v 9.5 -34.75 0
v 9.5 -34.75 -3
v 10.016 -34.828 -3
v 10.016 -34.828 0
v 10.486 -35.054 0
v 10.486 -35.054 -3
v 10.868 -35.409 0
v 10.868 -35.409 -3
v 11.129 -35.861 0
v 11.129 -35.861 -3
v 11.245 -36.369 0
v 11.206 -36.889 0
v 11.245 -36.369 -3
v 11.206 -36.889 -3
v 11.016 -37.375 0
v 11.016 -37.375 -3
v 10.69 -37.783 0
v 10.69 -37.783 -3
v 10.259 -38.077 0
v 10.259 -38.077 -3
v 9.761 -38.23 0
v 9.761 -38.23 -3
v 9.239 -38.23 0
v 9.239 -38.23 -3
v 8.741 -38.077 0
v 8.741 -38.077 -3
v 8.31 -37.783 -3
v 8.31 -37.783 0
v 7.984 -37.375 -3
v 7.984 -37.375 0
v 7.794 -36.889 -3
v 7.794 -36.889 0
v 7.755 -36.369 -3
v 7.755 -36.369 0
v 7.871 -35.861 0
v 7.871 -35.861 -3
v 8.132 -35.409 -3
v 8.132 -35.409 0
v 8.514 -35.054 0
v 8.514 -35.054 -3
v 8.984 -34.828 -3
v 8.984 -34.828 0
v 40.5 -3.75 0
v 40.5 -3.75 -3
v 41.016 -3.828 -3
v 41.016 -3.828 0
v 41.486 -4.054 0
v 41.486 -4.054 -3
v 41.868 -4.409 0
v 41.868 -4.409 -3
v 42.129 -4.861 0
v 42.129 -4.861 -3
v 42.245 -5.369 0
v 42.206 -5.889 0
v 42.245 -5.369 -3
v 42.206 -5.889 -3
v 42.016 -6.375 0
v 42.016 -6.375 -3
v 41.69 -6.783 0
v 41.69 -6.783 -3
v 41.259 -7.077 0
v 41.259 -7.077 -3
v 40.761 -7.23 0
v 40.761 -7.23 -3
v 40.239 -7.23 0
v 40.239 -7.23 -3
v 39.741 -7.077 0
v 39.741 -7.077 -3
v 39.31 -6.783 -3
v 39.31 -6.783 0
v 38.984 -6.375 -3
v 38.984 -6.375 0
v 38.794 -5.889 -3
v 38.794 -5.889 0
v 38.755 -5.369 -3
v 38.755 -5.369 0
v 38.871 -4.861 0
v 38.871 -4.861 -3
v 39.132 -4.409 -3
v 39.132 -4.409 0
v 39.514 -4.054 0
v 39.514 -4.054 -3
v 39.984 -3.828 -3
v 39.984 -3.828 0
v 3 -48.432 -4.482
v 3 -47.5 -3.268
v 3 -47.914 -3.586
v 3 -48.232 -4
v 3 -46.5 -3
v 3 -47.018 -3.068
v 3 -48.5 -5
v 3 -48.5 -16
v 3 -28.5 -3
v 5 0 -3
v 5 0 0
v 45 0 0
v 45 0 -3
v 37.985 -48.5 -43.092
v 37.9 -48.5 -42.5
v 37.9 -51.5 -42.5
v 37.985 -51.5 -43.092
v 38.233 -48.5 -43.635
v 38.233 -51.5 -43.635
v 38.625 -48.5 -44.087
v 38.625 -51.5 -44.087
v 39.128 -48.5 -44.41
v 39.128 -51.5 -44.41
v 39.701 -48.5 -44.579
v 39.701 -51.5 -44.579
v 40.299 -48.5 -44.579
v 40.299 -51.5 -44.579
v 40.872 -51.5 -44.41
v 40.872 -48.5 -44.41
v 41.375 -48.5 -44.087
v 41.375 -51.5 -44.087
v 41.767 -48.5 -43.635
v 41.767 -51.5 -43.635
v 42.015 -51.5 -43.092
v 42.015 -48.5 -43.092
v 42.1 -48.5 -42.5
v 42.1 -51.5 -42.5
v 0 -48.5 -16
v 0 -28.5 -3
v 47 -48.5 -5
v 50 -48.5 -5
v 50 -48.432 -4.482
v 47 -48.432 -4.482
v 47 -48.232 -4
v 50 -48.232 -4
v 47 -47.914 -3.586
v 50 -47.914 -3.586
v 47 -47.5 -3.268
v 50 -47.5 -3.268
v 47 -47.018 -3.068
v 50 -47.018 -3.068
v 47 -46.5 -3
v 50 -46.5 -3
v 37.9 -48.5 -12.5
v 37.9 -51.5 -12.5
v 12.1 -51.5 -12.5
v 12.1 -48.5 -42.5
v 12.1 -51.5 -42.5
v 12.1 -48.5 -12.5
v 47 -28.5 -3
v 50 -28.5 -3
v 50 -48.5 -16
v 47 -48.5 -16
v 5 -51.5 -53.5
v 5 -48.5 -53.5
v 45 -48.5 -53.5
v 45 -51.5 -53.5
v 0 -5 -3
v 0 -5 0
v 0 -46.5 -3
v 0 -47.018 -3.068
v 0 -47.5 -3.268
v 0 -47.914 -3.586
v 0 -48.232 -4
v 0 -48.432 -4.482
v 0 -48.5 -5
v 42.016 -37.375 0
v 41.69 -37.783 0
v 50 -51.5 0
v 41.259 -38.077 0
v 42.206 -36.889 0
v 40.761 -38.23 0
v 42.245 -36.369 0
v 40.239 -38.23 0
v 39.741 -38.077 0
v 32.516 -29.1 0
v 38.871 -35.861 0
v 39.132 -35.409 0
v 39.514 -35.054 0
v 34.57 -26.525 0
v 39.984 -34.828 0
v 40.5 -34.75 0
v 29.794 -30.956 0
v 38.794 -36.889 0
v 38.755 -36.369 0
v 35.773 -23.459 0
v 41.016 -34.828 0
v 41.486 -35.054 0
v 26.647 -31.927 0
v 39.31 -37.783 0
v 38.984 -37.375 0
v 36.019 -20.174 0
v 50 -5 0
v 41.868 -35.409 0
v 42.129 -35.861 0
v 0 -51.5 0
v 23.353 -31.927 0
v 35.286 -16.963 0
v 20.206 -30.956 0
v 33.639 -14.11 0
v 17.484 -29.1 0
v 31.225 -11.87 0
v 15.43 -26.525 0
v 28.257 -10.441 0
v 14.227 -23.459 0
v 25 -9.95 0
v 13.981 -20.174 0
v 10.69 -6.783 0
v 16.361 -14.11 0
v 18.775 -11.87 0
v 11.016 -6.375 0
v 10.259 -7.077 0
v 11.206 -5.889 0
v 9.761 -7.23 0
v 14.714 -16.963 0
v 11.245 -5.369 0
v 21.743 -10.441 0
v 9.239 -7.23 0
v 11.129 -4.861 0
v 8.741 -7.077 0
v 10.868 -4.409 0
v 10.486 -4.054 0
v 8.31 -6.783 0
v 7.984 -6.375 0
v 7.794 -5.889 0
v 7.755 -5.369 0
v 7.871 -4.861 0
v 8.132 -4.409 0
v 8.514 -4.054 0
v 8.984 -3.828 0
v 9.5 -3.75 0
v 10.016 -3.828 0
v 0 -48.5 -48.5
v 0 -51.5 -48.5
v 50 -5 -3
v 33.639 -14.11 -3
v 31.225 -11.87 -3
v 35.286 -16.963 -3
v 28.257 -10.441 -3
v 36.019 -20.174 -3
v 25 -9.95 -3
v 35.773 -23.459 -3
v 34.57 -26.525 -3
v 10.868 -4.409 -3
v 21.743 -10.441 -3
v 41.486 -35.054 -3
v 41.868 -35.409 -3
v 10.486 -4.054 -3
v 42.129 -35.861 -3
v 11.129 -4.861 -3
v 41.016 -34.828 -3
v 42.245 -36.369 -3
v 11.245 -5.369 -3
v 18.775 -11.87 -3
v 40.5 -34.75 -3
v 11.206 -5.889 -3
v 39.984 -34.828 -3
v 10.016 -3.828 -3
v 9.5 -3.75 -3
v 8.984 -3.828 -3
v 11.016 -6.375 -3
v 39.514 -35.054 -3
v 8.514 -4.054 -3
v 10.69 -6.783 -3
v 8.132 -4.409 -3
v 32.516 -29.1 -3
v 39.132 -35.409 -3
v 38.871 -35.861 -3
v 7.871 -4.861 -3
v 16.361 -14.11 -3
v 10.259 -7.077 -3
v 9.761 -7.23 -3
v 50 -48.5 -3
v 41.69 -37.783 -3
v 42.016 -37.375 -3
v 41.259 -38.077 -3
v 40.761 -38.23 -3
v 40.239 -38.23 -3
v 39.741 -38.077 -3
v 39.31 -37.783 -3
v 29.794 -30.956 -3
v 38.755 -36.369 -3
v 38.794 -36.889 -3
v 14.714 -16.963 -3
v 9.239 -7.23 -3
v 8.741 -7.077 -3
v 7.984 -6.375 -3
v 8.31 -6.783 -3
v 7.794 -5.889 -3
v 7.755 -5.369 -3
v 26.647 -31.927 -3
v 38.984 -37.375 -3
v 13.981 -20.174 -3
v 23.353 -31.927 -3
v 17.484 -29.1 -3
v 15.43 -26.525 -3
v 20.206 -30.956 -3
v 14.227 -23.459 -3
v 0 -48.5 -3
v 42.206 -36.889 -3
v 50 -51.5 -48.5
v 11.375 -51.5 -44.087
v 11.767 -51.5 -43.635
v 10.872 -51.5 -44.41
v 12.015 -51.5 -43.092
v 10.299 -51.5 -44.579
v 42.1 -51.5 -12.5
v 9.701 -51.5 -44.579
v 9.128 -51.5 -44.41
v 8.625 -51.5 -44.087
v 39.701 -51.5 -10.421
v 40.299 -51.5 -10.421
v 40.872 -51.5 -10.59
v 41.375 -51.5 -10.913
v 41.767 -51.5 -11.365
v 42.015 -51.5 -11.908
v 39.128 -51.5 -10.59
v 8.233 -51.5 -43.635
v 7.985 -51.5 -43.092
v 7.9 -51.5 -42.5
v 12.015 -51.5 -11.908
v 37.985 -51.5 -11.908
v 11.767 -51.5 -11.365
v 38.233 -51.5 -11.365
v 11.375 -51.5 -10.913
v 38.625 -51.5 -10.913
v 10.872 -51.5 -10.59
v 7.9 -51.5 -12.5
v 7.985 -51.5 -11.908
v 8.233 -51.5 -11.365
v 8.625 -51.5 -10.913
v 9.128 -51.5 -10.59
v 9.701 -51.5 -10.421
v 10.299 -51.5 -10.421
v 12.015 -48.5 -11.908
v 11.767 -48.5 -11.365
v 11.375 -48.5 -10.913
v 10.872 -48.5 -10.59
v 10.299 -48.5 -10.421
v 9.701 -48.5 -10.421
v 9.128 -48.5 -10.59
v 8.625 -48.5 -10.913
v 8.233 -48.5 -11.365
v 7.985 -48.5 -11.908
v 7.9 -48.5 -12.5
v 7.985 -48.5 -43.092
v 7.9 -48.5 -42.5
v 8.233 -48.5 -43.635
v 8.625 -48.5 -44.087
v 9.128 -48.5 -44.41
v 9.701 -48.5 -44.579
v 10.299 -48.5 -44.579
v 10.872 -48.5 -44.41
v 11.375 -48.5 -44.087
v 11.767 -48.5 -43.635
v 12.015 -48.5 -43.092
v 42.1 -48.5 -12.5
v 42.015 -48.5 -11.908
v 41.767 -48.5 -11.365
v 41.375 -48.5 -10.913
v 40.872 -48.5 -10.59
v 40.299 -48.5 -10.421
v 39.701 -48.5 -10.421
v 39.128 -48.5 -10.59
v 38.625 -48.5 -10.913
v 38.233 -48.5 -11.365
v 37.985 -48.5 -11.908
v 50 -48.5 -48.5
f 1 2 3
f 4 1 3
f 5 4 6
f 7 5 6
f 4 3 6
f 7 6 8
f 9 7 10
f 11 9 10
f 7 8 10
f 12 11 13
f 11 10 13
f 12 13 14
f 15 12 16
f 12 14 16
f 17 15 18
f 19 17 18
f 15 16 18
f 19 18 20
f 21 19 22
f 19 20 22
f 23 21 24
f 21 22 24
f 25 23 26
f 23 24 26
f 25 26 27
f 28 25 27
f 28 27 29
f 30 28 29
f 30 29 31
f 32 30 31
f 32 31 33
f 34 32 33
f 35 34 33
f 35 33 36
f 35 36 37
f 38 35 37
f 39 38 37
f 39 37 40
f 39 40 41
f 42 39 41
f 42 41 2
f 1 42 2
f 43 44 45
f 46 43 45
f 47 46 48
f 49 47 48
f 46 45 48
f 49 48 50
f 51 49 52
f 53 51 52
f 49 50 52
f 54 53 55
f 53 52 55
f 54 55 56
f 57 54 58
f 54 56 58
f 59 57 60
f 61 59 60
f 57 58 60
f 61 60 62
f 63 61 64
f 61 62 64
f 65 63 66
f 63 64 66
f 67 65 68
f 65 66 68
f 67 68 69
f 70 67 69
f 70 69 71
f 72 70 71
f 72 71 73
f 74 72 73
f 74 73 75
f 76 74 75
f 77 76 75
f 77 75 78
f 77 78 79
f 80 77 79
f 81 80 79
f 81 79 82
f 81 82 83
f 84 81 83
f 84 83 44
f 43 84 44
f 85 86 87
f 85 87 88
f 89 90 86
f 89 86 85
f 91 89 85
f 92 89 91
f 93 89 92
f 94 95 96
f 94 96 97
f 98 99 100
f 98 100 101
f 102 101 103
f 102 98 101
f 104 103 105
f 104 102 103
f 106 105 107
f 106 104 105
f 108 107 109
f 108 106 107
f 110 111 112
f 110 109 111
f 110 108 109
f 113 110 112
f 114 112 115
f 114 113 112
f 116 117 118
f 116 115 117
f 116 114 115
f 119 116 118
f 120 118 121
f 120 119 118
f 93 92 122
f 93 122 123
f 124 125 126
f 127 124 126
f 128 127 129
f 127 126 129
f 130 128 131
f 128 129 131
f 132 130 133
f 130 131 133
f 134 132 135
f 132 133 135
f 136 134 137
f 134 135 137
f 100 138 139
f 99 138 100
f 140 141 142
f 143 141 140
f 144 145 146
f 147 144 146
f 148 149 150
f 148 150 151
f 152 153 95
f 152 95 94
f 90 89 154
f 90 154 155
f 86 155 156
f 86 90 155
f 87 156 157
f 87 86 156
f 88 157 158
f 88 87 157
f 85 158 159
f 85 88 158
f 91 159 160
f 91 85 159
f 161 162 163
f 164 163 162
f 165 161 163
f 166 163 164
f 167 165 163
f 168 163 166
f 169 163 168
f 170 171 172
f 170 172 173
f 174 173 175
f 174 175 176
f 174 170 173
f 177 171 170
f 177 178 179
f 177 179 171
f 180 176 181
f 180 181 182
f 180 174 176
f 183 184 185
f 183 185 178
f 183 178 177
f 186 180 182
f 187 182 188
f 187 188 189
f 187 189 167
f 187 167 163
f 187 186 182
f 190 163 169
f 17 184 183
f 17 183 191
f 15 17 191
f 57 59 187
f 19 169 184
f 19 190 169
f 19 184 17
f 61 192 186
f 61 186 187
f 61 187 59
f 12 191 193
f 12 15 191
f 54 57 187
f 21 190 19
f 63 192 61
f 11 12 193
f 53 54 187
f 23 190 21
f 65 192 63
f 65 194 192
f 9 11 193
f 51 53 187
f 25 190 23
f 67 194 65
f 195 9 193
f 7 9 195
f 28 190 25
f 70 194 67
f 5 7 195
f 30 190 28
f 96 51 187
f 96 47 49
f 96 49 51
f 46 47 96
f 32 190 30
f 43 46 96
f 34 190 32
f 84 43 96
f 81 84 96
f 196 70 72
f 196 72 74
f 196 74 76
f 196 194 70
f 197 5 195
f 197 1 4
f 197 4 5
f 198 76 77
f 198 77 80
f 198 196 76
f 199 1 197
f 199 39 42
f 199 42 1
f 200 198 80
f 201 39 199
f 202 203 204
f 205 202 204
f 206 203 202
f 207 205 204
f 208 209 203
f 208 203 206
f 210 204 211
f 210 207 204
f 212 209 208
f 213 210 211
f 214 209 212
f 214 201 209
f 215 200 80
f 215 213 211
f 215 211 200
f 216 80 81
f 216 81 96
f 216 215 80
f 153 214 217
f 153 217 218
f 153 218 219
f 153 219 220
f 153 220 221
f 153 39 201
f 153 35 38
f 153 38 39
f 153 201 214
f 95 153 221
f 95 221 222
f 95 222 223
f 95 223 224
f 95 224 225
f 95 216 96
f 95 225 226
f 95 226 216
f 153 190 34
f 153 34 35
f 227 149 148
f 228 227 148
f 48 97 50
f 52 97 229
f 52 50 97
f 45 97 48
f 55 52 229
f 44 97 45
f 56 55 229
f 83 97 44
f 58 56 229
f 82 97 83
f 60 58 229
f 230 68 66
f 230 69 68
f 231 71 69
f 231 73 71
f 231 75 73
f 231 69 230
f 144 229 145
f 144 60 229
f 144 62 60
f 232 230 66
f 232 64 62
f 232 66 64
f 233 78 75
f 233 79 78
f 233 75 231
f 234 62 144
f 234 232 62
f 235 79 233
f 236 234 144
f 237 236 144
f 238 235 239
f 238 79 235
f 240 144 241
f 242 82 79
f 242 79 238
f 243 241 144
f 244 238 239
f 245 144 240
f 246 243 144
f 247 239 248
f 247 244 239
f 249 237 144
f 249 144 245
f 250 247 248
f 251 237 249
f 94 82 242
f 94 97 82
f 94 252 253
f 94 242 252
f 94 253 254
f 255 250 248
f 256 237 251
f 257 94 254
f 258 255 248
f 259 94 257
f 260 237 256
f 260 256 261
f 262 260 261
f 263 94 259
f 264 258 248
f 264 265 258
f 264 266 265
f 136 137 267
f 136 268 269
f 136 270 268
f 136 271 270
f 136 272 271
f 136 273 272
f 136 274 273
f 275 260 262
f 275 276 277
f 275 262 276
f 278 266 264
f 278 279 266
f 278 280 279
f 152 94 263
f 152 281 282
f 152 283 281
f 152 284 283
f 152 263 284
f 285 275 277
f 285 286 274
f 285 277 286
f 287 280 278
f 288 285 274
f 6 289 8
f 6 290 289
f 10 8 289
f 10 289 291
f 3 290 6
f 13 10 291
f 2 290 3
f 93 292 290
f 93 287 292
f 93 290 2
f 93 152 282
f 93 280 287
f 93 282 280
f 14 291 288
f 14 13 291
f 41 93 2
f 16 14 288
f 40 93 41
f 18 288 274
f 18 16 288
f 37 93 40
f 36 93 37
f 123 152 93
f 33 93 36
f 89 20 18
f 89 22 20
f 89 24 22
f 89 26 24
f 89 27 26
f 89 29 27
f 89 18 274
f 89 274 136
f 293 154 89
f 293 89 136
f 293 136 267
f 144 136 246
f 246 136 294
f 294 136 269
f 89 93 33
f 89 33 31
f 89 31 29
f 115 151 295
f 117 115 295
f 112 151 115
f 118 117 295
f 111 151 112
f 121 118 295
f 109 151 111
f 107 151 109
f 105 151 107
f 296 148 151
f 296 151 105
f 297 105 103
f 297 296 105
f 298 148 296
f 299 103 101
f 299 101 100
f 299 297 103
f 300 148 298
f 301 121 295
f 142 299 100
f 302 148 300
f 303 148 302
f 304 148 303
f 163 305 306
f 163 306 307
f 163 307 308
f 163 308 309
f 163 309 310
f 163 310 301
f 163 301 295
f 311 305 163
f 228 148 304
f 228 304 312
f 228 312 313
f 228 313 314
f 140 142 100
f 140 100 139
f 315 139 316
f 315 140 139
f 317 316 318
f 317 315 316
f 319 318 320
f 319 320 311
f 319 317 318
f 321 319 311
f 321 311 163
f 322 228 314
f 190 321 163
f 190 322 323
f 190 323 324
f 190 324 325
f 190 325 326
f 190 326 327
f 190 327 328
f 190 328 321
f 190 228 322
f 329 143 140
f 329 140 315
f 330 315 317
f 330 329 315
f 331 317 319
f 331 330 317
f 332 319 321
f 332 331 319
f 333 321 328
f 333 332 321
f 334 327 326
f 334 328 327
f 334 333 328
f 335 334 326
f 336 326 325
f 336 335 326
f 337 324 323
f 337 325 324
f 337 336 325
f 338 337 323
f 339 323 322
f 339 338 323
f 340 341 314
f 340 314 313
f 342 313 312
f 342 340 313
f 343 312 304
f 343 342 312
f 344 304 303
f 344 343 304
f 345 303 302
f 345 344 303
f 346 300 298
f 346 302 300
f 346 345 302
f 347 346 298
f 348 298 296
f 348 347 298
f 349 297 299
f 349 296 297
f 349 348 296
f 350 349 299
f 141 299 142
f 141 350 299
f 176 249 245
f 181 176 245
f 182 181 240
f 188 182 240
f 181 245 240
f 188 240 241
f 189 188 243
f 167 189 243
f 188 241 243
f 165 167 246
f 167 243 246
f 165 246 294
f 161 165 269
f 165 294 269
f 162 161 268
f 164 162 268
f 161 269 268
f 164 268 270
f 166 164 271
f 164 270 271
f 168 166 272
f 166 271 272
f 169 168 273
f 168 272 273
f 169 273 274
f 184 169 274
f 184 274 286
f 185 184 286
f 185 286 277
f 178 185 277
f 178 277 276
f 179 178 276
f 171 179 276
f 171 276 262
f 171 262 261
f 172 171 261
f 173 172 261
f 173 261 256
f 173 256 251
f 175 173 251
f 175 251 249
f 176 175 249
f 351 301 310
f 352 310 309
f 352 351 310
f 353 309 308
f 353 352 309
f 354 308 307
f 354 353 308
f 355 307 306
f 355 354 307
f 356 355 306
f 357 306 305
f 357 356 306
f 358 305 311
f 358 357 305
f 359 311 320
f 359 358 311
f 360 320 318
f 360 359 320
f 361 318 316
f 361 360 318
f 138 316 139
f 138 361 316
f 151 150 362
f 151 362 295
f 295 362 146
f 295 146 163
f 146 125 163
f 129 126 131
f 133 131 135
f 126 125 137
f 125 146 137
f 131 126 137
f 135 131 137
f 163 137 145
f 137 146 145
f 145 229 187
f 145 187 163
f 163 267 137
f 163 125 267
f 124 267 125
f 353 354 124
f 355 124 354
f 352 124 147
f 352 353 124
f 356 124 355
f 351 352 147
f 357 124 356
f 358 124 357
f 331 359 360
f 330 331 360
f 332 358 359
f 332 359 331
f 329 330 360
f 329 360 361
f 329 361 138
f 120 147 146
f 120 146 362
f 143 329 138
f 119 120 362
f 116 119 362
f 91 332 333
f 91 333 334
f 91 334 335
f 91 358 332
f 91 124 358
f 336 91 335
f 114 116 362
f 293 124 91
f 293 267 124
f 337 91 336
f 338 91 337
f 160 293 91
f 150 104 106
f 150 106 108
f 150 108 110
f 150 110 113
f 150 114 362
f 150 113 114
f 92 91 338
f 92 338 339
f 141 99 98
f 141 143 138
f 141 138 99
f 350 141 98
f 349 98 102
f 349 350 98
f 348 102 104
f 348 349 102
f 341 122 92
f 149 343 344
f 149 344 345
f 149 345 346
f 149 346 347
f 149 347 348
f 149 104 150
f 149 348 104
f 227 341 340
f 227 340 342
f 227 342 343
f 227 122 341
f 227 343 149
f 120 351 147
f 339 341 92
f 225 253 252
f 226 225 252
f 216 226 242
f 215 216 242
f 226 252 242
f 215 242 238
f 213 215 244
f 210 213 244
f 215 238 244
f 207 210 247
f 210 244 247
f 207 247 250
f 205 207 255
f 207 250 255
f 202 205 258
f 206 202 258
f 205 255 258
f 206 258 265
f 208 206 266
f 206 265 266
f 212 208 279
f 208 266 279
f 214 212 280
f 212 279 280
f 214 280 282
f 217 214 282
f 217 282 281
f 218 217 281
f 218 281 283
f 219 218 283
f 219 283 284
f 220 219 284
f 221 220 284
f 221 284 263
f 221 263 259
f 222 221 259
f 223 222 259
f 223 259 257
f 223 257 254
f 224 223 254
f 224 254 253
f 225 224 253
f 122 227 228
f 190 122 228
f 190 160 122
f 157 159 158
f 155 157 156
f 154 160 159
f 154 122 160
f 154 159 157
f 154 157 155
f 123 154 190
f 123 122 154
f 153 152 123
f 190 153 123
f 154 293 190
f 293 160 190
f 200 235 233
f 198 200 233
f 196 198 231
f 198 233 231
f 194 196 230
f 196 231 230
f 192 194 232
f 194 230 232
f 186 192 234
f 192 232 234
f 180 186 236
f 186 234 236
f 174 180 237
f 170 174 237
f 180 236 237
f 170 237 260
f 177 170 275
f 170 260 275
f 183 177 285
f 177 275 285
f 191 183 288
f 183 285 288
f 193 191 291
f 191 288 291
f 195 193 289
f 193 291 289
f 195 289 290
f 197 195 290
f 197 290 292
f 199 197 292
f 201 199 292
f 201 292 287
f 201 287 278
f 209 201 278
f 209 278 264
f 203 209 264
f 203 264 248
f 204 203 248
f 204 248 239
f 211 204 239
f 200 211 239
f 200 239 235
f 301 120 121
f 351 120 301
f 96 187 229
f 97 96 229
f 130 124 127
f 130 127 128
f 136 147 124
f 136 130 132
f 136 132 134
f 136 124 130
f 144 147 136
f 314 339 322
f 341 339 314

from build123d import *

# Parameters (mm, degrees)
EXTRUDE_1_DEPTH     = 50
SKETCH_2_R          = 11.05
CUT_EXTRUDE_1_DEPTH = 88.76388779
CHAMFER_1_SIZE      = 5
SKETCH_3_R          = 1.75
CUT_EXTRUDE_2_DEPTH = 88.76388779
EXTRUDE_3_DEPTH     = 3
EXTRUDE_START       = -3
EXTRUDE_4_DEPTH     = 3
CUT_EXTRUDE_3_DEPTH = 88.832226432


with BuildPart() as part:
    # 草图1 → 凸台-拉伸1 (new body)
    with BuildSketch(Plane(origin=(0, 0, 0), x_dir=(0, 0, -1), z_dir=(1, 0, 0))):
        Polygon((0, 0), (3, 0), (3, -48.5), (53.5, -48.5), (53.5, -51.5), (0, -51.5), align=None)
    extrude(amount=EXTRUDE_1_DEPTH)

    # 草图2 → 切除-拉伸1 (cut, through all)
    with BuildSketch(Plane(origin=(0, 0, -3), x_dir=(-1, 0, 0), z_dir=(0, 0, -1))):
        with Locations(Location((-25, -21, 0), (0, 0, 90))):
            Circle(SKETCH_2_R)
    extrude(amount=-CUT_EXTRUDE_1_DEPTH, mode=Mode.SUBTRACT)

    # 倒角1
    chamfer_1_edges = [part.edges().sort_by_distance(p)[0] for p in [
        (50, -50, -53.5),
        (50, 0, -1.5),
        (0, 0, -1.5),
        (0, -50, -53.5),
    ]]
    chamfer(chamfer_1_edges, length=CHAMFER_1_SIZE)

    # 草图3 → 切除-拉伸2 (cut, through all)
    with BuildSketch(Plane(origin=(0, 0, -3), x_dir=(-1, 0, 0), z_dir=(0, 0, -1))):
        with Locations(Location((-40.5, -5.5, 0), (0, 0, 90))):
            Circle(SKETCH_3_R)
        with Locations(Location((-9.5, -5.5, 0), (0, 0, 90))):
            Circle(SKETCH_3_R)
        with Locations(Location((-9.5, -36.5, 0), (0, 0, 90))):
            Circle(SKETCH_3_R)
        with Locations(Location((-40.5, -36.5, 0), (0, 0, 90))):
            Circle(SKETCH_3_R)
    extrude(amount=-CUT_EXTRUDE_2_DEPTH, mode=Mode.SUBTRACT)

    # 草图4 → 凸台-拉伸3 (add)
    with BuildSketch(Plane(origin=(50, 0, 0), x_dir=(0, 0, -1), z_dir=(1, 0, 0))):
        with BuildLine():
            Line((3, -28.5), (16, -48.5))
            Line((16, -48.5), (5, -48.5))
            ThreePointArc((5, -48.5), (3.585786438, -47.914213562), (3, -46.5))
            Line((3, -46.5), (3, -28.5))
        make_face()
    extrude(amount=-EXTRUDE_3_DEPTH)

    # 草图5 → 凸台-拉伸4 (add)
    with BuildSketch(Plane.ZY.offset(EXTRUDE_START)):
        with BuildLine():
            Line((-5, -48.5), (-16, -48.5))
            Line((-16, -48.5), (-3, -28.5))
            Line((-3, -28.5), (-3, -46.5))
            ThreePointArc((-3, -46.5), (-3.585786438, -47.914213562), (-5, -48.5))
        make_face()
    extrude(amount=EXTRUDE_4_DEPTH)

    # 草图6 → 切除-拉伸3 (cut, through all)
    with BuildSketch(Plane(origin=(0, -48.5, 0), x_dir=(1, 0, 0), z_dir=(0, 1, 0))):
        with BuildLine():
            Line((12.1, 42.5), (12.1, 12.5))
            ThreePointArc((12.1, 12.5), (10, 10.4), (7.9, 12.5))
            Line((7.9, 12.5), (7.9, 42.5))
            ThreePointArc((7.9, 42.5), (10, 44.6), (12.1, 42.5))
        make_face()
        with BuildLine():
            Line((42.1, 42.5), (42.1, 12.5))
            ThreePointArc((42.1, 12.5), (40, 10.4), (37.9, 12.5))
            Line((37.9, 12.5), (37.9, 42.5))
            ThreePointArc((37.9, 42.5), (40, 44.6), (42.1, 42.5))
        make_face()
    extrude(amount=-CUT_EXTRUDE_3_DEPTH, mode=Mode.SUBTRACT)


solid = part.part
